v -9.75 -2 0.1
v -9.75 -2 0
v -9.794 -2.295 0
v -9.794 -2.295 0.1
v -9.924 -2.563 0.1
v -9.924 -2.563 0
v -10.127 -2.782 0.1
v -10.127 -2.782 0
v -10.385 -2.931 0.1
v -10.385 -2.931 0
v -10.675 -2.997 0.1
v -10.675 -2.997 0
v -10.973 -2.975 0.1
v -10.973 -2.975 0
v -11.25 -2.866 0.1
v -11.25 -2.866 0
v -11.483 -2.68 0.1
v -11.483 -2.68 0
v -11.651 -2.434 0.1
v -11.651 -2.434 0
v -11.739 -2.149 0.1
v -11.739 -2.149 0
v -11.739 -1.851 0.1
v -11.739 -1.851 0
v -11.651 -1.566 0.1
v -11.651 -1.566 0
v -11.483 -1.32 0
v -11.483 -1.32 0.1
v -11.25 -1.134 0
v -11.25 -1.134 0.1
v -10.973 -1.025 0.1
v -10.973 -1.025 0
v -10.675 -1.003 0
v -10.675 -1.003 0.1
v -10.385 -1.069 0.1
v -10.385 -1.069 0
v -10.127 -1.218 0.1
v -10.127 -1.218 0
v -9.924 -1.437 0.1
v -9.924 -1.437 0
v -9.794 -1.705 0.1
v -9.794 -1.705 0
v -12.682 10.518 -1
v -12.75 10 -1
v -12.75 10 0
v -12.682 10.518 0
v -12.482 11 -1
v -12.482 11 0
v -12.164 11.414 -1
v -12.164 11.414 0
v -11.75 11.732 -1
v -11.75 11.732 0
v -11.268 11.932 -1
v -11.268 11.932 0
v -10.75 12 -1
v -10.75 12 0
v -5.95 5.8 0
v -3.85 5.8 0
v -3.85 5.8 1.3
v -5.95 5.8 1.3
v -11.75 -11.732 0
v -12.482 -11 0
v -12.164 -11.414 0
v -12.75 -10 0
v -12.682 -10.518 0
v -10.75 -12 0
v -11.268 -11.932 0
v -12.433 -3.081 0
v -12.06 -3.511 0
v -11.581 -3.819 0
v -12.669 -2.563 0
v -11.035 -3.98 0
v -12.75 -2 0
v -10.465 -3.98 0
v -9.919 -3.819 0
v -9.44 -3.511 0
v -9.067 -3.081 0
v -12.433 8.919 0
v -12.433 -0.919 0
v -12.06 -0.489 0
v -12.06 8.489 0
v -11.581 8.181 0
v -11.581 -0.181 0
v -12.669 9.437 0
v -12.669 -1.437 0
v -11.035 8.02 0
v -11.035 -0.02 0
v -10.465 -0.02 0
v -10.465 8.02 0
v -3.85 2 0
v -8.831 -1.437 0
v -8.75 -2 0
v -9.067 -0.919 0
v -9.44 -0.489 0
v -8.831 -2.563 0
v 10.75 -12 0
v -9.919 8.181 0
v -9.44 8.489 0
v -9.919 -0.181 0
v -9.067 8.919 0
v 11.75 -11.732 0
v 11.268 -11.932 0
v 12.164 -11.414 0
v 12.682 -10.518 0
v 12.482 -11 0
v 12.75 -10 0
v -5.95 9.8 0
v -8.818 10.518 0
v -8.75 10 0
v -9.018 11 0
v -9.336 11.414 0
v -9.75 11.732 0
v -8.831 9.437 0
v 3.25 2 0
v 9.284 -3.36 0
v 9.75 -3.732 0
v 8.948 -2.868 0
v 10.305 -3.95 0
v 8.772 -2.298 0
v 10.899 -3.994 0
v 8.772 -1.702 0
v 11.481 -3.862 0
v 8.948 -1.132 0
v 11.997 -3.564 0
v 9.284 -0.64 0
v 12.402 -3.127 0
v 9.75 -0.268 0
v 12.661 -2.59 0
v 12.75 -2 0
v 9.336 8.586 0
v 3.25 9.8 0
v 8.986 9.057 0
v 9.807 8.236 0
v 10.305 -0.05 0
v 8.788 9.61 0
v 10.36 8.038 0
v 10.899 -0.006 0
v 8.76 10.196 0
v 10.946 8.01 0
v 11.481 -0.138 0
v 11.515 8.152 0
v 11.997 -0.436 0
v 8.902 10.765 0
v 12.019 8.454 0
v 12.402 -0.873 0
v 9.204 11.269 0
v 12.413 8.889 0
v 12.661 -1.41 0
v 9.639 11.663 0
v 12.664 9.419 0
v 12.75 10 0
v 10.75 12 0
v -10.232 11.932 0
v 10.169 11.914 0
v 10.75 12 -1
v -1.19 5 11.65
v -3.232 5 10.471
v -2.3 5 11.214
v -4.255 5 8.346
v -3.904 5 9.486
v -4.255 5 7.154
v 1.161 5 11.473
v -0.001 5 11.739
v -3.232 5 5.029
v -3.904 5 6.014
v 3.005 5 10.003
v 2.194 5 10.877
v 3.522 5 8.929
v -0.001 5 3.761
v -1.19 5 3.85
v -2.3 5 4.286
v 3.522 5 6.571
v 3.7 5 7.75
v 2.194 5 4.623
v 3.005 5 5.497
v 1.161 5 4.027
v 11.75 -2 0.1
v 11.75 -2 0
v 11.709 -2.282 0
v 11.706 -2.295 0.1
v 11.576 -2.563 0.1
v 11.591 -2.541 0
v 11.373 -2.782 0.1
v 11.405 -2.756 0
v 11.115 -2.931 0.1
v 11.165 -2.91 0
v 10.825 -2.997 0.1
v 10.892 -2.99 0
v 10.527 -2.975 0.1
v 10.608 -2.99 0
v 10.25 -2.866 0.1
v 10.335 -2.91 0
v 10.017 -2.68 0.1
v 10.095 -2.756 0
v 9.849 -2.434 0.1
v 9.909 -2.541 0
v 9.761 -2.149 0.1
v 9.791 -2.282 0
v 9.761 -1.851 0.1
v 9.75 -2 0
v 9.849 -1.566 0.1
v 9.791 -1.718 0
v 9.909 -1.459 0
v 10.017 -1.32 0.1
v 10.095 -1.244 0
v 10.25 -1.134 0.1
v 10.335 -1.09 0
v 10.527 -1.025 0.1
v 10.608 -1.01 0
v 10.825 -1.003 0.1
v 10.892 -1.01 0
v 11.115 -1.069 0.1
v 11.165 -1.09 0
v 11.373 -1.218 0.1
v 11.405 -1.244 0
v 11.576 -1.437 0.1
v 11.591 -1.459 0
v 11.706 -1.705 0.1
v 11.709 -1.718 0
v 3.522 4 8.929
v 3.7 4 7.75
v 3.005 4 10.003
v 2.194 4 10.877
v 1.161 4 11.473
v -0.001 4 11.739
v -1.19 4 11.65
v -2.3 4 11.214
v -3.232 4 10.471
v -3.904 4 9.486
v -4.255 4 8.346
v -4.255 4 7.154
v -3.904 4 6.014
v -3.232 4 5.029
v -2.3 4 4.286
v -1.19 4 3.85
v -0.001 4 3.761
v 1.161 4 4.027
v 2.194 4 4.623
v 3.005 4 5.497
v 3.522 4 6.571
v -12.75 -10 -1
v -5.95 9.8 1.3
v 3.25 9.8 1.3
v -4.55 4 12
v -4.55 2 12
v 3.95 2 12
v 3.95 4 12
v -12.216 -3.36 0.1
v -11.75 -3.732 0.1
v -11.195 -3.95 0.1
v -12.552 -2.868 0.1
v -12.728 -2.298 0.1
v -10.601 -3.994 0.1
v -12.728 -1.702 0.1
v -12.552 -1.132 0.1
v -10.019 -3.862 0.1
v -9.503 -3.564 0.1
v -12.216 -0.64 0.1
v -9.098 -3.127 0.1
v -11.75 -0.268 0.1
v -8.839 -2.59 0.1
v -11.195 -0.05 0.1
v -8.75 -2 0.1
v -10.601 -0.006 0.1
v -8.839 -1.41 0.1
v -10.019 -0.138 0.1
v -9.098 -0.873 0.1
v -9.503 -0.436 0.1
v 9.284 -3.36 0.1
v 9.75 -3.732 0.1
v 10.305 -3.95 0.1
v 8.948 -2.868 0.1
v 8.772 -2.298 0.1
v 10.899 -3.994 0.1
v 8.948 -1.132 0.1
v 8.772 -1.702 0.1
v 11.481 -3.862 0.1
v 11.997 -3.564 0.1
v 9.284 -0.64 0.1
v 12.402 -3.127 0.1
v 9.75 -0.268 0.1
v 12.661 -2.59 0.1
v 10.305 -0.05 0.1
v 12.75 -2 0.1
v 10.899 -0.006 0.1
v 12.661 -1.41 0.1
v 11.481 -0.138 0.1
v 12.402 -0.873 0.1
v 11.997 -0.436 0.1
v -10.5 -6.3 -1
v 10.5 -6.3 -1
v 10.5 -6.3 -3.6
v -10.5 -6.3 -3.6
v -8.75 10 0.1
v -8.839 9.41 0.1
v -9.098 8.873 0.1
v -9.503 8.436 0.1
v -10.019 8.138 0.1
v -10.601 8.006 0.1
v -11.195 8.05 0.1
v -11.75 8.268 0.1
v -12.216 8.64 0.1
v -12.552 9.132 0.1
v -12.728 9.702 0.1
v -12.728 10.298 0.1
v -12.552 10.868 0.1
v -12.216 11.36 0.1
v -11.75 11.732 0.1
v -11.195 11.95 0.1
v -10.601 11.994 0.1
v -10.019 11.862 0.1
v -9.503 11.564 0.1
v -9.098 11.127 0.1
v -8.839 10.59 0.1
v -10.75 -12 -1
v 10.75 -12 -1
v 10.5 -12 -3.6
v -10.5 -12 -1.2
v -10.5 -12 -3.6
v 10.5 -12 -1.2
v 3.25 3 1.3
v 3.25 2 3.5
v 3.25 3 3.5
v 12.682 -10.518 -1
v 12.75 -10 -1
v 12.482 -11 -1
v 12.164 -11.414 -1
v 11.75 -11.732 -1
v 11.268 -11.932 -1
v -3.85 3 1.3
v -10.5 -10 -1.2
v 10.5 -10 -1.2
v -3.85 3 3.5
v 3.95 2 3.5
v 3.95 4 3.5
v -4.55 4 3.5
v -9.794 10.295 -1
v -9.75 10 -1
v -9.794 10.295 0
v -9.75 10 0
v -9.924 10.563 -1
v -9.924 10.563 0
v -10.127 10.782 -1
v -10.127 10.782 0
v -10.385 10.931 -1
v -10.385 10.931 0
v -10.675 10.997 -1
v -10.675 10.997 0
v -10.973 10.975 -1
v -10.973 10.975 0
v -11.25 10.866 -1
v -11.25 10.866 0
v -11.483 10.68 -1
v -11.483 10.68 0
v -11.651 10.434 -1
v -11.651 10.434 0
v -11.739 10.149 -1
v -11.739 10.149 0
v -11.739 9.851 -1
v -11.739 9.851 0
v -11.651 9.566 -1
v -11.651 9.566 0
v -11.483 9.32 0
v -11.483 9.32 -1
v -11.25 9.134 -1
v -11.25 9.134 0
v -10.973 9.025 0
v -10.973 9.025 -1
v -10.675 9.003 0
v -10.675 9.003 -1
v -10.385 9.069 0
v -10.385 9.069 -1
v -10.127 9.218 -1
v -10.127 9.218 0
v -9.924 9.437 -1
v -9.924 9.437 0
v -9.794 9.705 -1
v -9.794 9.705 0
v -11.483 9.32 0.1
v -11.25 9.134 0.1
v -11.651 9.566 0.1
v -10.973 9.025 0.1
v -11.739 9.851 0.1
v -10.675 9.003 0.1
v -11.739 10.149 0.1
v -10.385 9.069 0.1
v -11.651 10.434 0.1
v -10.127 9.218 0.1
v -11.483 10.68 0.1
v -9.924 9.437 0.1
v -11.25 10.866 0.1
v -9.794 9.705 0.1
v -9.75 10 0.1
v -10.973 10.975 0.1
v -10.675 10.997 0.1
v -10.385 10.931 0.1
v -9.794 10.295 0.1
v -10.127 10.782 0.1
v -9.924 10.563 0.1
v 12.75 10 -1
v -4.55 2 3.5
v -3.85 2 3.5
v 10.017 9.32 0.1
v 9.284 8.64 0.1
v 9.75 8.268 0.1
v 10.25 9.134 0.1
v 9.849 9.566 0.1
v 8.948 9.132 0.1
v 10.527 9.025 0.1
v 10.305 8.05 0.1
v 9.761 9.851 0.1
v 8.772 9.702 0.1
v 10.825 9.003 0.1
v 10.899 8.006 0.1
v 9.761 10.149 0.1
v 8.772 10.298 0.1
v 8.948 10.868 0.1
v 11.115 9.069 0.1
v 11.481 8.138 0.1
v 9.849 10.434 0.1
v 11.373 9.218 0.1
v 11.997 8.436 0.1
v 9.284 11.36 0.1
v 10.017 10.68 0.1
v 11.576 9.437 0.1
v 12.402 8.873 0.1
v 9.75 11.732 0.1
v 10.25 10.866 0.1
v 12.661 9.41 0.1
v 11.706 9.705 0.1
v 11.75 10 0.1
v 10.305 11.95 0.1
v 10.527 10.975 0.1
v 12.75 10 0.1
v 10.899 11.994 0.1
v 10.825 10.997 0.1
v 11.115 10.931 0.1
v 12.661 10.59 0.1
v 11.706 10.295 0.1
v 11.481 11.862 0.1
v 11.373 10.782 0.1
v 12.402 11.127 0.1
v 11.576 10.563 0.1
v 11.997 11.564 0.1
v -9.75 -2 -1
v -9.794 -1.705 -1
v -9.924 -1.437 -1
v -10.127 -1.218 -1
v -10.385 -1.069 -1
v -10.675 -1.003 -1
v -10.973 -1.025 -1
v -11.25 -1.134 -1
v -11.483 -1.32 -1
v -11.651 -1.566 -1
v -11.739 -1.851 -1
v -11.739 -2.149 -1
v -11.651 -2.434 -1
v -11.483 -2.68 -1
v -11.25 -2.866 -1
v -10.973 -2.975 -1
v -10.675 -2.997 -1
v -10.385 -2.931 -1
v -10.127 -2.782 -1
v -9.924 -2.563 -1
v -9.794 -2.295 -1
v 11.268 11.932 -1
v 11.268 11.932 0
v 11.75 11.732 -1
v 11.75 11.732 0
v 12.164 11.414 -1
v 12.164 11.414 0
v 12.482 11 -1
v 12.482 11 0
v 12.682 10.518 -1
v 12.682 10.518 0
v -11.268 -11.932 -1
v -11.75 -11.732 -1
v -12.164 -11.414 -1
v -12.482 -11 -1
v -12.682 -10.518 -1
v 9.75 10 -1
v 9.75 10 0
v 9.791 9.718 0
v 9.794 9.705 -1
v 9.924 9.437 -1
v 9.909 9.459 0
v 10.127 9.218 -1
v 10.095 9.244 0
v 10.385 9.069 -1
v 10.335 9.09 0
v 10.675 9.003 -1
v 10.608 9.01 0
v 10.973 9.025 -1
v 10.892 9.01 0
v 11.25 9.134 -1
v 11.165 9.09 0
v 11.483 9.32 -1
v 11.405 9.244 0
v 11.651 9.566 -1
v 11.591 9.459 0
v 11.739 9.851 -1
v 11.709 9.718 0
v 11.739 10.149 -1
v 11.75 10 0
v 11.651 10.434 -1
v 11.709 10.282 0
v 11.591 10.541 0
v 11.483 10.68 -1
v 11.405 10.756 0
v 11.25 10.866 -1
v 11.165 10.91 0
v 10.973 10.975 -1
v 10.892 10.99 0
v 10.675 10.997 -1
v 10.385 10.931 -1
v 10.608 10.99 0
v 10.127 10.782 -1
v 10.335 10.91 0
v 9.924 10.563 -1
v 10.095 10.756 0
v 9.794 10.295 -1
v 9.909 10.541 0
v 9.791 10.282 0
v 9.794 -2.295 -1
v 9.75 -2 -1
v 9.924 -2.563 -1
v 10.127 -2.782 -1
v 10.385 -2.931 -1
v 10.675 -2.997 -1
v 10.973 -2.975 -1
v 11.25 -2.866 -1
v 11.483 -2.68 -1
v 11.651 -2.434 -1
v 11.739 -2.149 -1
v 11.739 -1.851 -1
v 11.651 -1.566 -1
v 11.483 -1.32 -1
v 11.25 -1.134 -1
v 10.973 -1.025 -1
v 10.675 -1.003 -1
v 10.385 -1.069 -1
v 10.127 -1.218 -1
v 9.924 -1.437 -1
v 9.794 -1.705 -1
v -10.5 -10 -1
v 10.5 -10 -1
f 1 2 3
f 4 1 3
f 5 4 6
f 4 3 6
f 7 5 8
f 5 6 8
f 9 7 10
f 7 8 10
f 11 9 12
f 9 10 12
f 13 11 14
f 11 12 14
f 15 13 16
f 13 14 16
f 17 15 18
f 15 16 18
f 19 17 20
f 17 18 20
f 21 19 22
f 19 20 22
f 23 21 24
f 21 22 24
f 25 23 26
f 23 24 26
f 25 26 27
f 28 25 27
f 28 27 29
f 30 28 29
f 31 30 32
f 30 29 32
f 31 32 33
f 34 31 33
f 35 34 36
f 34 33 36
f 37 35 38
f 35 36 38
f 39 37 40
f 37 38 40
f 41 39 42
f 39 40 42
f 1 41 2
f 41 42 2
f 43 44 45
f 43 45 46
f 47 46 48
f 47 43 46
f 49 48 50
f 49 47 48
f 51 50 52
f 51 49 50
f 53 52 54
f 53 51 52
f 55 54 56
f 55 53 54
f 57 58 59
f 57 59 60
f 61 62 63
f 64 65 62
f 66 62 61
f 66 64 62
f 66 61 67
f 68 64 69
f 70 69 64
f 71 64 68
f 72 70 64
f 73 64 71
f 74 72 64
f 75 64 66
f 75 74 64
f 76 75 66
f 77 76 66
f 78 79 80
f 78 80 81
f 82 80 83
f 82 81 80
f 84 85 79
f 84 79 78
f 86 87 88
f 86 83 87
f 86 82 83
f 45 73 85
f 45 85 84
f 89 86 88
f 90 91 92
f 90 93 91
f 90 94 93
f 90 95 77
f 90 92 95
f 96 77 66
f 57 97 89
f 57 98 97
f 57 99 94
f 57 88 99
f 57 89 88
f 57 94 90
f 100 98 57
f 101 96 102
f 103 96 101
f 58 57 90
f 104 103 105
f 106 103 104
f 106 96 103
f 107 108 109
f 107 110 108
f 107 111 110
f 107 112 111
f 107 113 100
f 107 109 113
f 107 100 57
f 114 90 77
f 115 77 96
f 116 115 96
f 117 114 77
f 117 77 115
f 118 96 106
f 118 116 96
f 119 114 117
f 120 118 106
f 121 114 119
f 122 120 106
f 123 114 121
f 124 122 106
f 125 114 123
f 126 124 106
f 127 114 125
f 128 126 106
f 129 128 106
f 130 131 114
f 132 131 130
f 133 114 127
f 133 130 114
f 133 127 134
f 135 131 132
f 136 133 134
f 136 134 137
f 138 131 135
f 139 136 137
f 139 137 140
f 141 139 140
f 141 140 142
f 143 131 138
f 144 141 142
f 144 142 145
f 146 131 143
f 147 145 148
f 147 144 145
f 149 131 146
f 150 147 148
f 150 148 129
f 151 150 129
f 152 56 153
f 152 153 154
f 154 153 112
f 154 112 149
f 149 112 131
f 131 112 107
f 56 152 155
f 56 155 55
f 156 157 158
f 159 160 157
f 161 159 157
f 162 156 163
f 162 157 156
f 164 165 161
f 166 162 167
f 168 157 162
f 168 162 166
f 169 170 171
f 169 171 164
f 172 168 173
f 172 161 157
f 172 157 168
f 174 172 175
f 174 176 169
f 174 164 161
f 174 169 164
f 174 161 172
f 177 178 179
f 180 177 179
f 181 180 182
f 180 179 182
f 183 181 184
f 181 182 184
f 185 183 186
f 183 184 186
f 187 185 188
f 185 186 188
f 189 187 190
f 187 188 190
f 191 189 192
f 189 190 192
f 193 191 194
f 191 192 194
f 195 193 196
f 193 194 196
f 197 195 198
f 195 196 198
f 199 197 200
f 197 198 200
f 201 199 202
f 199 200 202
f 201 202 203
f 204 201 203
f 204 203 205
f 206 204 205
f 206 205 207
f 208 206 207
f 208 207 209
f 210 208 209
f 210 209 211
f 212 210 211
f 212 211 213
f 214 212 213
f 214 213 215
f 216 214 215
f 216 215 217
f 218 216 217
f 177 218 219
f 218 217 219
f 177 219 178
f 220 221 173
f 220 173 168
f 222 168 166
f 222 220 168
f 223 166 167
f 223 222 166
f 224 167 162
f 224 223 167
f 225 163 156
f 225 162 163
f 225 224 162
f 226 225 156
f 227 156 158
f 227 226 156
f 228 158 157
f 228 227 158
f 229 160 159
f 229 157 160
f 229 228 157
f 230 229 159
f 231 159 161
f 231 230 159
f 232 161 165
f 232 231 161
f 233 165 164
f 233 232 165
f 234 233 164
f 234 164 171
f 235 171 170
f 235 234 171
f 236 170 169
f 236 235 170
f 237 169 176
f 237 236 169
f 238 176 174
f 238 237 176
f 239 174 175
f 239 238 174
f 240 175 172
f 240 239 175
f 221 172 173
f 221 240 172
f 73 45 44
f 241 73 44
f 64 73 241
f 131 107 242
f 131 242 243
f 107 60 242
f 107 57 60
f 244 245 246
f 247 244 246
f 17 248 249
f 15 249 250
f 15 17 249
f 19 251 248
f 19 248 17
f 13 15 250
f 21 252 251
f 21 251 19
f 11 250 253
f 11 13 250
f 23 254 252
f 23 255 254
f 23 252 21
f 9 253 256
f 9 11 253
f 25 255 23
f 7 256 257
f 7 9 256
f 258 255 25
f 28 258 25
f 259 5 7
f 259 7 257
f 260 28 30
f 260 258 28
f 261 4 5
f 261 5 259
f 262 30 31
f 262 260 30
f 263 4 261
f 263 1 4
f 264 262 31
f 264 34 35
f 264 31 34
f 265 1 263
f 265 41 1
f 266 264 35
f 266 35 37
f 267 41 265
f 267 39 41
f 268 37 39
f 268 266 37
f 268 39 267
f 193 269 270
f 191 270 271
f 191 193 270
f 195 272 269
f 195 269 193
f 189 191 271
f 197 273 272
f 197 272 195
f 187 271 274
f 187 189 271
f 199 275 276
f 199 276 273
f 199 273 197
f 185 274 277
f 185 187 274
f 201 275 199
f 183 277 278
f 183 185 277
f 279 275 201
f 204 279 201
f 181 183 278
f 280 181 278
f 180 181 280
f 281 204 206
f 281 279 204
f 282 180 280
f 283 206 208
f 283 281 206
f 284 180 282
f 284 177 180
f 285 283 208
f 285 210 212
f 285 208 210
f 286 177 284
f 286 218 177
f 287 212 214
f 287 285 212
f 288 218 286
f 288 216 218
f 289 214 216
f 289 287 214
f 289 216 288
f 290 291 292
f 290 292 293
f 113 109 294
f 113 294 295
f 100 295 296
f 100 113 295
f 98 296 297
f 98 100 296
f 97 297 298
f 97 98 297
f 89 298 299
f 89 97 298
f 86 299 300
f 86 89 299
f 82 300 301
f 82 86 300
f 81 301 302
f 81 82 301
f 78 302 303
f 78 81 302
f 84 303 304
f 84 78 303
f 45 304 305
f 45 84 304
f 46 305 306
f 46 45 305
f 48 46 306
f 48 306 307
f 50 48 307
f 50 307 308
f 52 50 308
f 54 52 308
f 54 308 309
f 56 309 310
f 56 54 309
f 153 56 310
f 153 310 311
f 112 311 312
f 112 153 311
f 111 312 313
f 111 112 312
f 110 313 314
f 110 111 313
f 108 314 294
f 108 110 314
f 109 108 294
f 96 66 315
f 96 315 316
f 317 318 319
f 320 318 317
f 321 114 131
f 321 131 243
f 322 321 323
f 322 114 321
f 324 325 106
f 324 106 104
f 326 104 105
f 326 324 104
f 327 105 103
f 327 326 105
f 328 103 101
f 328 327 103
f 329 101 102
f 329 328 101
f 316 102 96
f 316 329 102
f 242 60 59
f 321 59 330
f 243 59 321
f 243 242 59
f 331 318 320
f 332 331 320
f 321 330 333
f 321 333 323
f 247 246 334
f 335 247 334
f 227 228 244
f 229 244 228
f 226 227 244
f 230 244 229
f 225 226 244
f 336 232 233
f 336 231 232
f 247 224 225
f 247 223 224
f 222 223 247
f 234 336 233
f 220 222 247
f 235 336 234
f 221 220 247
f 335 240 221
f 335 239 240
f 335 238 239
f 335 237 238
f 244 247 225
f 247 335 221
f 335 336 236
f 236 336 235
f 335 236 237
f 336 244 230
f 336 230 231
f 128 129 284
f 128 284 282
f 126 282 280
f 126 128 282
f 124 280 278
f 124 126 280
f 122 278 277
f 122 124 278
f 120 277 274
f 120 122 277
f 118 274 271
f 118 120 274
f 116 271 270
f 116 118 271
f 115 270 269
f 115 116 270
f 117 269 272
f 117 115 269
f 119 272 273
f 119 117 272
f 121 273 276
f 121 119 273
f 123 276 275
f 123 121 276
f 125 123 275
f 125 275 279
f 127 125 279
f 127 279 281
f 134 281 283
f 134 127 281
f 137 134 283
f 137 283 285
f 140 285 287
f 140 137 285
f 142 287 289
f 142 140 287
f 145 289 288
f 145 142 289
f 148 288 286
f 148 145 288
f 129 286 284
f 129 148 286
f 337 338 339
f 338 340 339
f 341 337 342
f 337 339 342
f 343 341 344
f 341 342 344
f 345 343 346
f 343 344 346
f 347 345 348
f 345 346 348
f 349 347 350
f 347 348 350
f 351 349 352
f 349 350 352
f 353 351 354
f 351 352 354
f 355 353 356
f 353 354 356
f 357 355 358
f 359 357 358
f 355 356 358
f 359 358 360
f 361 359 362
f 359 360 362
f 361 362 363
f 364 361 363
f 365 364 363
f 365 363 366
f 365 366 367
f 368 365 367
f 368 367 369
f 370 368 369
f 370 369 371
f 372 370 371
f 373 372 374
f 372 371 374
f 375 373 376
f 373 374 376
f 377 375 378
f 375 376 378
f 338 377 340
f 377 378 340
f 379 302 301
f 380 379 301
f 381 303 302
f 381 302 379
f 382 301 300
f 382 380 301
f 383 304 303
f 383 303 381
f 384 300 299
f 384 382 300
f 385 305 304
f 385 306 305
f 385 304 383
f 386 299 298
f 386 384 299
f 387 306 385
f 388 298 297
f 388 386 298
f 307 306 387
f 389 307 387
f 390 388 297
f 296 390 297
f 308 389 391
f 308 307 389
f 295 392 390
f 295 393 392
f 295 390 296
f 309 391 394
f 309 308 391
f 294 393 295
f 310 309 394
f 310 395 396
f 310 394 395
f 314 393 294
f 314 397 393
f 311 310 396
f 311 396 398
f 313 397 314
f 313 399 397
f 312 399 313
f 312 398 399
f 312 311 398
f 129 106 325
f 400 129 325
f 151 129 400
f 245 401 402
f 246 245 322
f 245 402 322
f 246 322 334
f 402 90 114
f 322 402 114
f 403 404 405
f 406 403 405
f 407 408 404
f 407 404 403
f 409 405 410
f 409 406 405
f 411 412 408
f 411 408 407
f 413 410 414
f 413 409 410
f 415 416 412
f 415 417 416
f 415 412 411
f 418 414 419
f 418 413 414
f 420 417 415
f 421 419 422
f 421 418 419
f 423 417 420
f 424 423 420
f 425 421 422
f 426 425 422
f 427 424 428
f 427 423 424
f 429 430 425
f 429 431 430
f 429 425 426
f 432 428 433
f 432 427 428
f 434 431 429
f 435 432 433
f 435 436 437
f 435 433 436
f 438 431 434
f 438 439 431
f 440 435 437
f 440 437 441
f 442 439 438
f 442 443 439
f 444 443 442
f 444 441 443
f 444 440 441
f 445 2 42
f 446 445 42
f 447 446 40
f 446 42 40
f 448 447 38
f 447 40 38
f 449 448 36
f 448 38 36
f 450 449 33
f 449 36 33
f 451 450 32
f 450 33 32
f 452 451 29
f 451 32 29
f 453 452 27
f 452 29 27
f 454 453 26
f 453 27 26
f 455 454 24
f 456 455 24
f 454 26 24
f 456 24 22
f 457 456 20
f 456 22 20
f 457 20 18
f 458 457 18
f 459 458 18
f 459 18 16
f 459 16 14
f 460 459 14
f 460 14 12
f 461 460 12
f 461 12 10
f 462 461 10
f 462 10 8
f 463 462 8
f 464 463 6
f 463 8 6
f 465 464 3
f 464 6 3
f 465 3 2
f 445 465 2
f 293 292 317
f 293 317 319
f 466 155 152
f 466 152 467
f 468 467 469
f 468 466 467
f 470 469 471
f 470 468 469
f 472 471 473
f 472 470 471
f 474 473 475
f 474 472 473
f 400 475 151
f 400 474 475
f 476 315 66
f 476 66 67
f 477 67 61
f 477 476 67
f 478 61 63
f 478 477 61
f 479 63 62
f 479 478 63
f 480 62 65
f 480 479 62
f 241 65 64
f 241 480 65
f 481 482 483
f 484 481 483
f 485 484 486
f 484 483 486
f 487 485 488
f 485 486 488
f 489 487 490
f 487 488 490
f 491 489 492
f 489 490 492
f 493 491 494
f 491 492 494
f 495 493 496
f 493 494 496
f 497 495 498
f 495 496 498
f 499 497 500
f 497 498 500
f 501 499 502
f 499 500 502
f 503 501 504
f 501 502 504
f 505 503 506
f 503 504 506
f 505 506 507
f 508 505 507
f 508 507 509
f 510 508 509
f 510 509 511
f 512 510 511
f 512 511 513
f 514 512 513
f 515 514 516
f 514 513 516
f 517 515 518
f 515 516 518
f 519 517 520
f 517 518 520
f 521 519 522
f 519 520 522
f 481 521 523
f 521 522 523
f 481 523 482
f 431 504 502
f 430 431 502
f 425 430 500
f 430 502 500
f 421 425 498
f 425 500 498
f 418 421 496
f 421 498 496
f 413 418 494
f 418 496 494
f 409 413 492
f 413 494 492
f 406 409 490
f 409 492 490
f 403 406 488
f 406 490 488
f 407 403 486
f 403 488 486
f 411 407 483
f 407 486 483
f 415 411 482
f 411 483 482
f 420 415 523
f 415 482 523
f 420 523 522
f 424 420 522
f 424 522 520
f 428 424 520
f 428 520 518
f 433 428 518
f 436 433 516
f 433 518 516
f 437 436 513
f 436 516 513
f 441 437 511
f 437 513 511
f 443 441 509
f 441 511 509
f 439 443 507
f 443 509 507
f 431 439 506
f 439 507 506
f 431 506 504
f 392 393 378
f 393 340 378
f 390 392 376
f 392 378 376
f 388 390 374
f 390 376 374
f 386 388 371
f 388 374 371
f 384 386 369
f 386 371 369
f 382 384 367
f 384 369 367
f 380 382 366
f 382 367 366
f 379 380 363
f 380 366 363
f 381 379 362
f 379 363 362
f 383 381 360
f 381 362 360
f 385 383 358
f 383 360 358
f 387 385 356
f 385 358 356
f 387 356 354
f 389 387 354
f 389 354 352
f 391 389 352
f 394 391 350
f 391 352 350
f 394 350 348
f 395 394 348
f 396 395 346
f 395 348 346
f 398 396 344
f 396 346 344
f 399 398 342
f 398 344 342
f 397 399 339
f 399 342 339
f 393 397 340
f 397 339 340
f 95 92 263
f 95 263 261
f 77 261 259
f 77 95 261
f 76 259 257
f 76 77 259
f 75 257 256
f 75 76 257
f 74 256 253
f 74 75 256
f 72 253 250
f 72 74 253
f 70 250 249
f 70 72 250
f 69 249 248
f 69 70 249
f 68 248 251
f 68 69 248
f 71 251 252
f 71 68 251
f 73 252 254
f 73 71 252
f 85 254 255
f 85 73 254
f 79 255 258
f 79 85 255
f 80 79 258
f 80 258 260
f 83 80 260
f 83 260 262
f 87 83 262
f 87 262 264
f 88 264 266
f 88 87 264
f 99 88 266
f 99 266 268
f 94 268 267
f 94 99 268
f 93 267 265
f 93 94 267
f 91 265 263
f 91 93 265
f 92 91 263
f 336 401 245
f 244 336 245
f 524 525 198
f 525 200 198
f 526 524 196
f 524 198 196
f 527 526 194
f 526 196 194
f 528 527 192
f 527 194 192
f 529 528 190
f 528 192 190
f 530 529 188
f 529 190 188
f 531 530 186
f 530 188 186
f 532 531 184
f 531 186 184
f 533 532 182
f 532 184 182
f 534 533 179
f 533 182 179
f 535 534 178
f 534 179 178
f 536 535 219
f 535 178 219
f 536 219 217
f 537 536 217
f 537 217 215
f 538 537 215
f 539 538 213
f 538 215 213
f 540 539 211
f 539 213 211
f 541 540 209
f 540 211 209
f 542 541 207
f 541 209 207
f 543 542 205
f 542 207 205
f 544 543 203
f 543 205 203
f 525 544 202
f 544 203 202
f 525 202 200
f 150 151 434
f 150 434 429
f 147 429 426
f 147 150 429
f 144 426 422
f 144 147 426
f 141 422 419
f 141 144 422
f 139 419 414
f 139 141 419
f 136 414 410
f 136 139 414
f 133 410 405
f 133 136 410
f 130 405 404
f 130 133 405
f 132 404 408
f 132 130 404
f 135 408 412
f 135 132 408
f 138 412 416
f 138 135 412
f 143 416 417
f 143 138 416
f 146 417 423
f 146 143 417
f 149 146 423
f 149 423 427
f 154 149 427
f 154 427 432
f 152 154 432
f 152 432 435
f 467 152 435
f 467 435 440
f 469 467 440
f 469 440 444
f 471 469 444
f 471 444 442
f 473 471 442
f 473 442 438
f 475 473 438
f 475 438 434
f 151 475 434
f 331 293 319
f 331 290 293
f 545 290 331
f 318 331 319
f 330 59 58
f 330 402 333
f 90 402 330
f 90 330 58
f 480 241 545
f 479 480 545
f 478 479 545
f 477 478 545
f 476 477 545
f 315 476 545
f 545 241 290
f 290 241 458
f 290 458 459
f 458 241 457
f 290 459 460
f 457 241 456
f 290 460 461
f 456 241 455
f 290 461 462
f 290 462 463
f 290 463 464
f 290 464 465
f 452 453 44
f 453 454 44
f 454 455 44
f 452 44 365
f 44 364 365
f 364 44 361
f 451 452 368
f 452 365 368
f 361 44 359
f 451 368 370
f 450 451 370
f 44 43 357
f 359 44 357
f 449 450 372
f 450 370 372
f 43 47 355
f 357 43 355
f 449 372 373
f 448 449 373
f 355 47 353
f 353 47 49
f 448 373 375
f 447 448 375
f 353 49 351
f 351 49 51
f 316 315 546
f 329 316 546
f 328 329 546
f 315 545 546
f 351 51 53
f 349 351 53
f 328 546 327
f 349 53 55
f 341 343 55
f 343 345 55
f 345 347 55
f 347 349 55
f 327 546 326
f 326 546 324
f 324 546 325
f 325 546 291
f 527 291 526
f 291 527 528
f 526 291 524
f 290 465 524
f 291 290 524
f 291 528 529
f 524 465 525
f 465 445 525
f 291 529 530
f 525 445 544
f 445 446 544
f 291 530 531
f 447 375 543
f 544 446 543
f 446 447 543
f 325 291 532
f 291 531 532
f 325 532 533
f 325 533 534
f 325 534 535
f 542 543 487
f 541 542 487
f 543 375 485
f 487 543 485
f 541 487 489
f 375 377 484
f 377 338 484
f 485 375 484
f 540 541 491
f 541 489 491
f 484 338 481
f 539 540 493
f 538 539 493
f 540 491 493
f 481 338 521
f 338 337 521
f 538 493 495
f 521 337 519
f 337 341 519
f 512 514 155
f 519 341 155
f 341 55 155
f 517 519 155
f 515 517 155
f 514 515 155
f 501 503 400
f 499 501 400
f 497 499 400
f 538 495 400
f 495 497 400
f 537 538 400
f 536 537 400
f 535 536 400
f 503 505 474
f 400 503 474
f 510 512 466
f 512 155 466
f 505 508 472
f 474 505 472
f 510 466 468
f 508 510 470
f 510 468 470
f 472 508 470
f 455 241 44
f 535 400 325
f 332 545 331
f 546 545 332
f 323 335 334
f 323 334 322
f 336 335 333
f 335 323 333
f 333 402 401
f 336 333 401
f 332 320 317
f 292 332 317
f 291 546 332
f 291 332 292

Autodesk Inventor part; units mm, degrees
ref_plane "YZ Plane" through (0, 0, 0) normal (1, 0, 0) x (0, 1, 0)
ref_plane "XZ Plane" through (0, 0, 0) normal (0, 1, 0) x (-1, 0, 0)
sketch "스케치1" plane through (0, 0, 0) normal (0, 0, 1) x (1, 0, 0)
  line L0 (-12.75, -12) -> (12.75, -12)
  line L1 (12.75, -12) -> (12.75, 12)
  line L2 (12.75, 12) -> (-12.75, 12)
  line L3 (-12.75, 12) -> (-12.75, -12)
  line L4 (-12.75, -12) -> (12.75, 12) construction
  line L5 (12.75, -12) -> (-12.75, 12) construction
  line L6 (-4.25, 2.8) -> (4.25, 2.8)
  line L7 (4.25, 2.8) -> (4.25, -5.7)
  line L8 (4.25, -5.7) -> (-4.25, -5.7)
  line L9 (-4.25, -5.7) -> (-4.25, 2.8)
  line L10 (-4.25, 2.8) -> (4.25, -5.7) construction
  line L11 (4.25, 2.8) -> (-4.25, -5.7) construction
  line L12 (-5.95, 9.8) -> (3.25, 9.8)
  line L13 (3.25, 9.8) -> (3.25, 5.8)
  line L14 (3.25, 5.8) -> (-5.95, 5.8)
  line L15 (-5.95, 5.8) -> (-5.95, 9.8)
  line L16 (3.25, 9.8) -> (-3.85, 9.8)
  line L17 (-3.85, 9.8) -> (-3.85, 2.8)
  line L18 (-3.85, 2.8) -> (3.25, 2.8)
  line L19 (3.25, 2.8) -> (3.25, 9.8)
  circle A0 centre (-10.75, 10) radius 1
  point P0 (0, 0)
  point P1 (0, -1.45)
  point P2 (3.25, 2.8)
  point P3 (-3.85, 5.8)
  point P4 (0, -1.45)
  point P5 (0, 0)
  dimension "d0" = 25.5
  dimension "d1" = 24
  dimension "d2" = 8.5
  dimension "d3" = 8.5
  dimension "d4" = 17.7
  dimension "d5" = 1
  dimension "d6" = 7.1
  dimension "d7" = 4
  dimension "d8" = 7
  dimension "d9" = 9.2
  dimension "d10" = 2
  dimension "d11" = 2
  dimension "d12" = 2
extrude "돌출1" add sketch "스케치1" against normal blind 1 contours L3 L2 L1 L0 | L6 L7 L8 L9 | L17 L14 L19 L6 | L17 L12 L13 L14 | L14 L15 L12 L17 | A0
extrude "돌출2" cut sketch "스케치1" against normal blind 1 contours A0
extrude "돌출3" add sketch "스케치1" along normal blind 1.3 contours L17 L14 L19 L6 | L17 L12 L13 L14 | L14 L15 L12 L17
fillet "모깎기1" radius 2 4 edges at (-12.75, 12, -0.5) (-12.75, -12, -0.5) (12.75, -12, -0.5) (12.75, 12, -0.5)
mirror "미러3" about plane through (0, 0, 0) normal (1, 0, 0) of "돌출2"
pattern_linear "직사각형 패턴1" count 2 spacing 12 along (0, -1, 0) of "돌출2", "미러3"
sketch "스케치2" plane through (0, 0, 0) normal (0, 0, 1) x (1, 0, 0)
  point P0 (0, 0)
sketch "스케치4" plane through (0, 0, 0) normal (0, 0, 1) x (1, 0, 0)
  circle A0 centre (-10.75, 10) radius 1 projected
  arc A1 (-10.75, 12) -> (-12.75, 10) centre (-10.75, 10) ccw projected
  circle A2 centre (-10.75, 10) radius 2
  circle A3 centre (10.75, 10) radius 1 projected
  line L0 (10.75, 12) -> (-10.75, 12) projected
  circle A4 centre (10.75, 10) radius 2
  circle A5 centre (10.75, -2) radius 1 projected
  circle A6 centre (10.75, -2) radius 2
  circle A7 centre (-10.75, -2) radius 2
  line L1 (-12.75, 10) -> (-12.75, -10) projected
  circle A8 centre (-10.75, -2) radius 1 projected
  point P0 (0, 0)
  point P1 (-12.75, 10)
extrude "돌출7" add sketch "스케치4" along normal blind 0.1
sketch "스케치5" plane through (0, 0, -1) normal (0, 0, -1) x (-1, 0, 0)
  line L0 (10.75, -12) -> (-10.75, -12) projected
  line L1 (-10.5, -6.3) -> (10.5, -6.3)
  line L2 (10.5, -6.3) -> (10.5, -12)
  line L3 (10.5, -12) -> (-10.5, -12)
  line L4 (-10.5, -12) -> (-10.5, -6.3)
  point P0 (0, 0)
  point P1 (0, -12)
  dimension "d36" = 21
  dimension "d37" = 5.7
extrude "돌출8" add sketch "스케치5" along normal blind 2.6
sketch "스케치6" plane through (-10.75, -12, 0) normal (0, -1, 0) x (1, 0, 0)
  line L0 (21.25, -1) -> (0.25, -1) projected
  line L1 (0.25, -1) -> (0.25, -3.6) projected
  line L2 (21.25, -1) -> (0.25, -1)
  line L3 (0.25, -1) -> (0.25, -1.2)
  line L4 (0.25, -1.2) -> (21.25, -1.2)
  line L5 (21.25, -1.2) -> (21.25, -1)
  point P0 (10.75, 0)
  dimension "d40" = 0.2
extrude "돌출9" cut sketch "스케치6" against normal blind 2
ref_plane "작업 평면1" through (-10.75, 2, 0) normal (0, 1, 0) x (1, 0, 0)
sketch "스케치7" plane through (-10.75, 2, 0) normal (0, 1, 0) x (1, 0, 0)
  line L0 (14, 0) -> (6.9, 0) projected
  line L1 (6.9, 0) -> (14, 0)
  line L2 (14, 0) -> (14, -3.5)
  line L3 (14, -3.5) -> (6.9, -3.5)
  line L4 (6.9, -3.5) -> (6.9, 0)
  line L5 (6.2, -12) -> (14.7, -12)
  line L6 (14.7, -12) -> (14.7, -3.5)
  line L7 (14.7, -3.5) -> (6.2, -3.5)
  line L8 (6.2, -3.5) -> (6.2, -12)
  line L9 (6.2, -12) -> (14.7, -3.5) construction
  line L10 (14.7, -12) -> (6.2, -3.5) construction
  point P0 (10.75, 0)
  point P1 (10.45, -7.75)
  point P2 (10.45, -3.5)
  dimension "d45" = 12
  dimension "d46" = 8.5
  dimension "d47" = 8.5
extrude "돌출10" add sketch "스케치7" along normal blind 1 contours L2 L3 L4 L0
extrude "돌출11" add sketch "스케치7" along normal blind 2 contours L7 L6 L5 L8 L3
sketch "스케치8" plane through (-10.75, 4, 0) normal (0, 1, 0) x (1, 0, 0)
  line L0 (6.2, -12) -> (14.7, -12) projected
  line L1 (10.45, -12) -> (10.45, -3.5) construction
  line L2 (6.9, -3.5) -> (14, -3.5) projected
  circle A0 centre (10.45, -7.75) radius 4
  point P0 (10.75, 0)
  dimension "d52" = 8
extrude "돌출12" add sketch "스케치8" along normal blind 1
properties part number "RasCamera"
